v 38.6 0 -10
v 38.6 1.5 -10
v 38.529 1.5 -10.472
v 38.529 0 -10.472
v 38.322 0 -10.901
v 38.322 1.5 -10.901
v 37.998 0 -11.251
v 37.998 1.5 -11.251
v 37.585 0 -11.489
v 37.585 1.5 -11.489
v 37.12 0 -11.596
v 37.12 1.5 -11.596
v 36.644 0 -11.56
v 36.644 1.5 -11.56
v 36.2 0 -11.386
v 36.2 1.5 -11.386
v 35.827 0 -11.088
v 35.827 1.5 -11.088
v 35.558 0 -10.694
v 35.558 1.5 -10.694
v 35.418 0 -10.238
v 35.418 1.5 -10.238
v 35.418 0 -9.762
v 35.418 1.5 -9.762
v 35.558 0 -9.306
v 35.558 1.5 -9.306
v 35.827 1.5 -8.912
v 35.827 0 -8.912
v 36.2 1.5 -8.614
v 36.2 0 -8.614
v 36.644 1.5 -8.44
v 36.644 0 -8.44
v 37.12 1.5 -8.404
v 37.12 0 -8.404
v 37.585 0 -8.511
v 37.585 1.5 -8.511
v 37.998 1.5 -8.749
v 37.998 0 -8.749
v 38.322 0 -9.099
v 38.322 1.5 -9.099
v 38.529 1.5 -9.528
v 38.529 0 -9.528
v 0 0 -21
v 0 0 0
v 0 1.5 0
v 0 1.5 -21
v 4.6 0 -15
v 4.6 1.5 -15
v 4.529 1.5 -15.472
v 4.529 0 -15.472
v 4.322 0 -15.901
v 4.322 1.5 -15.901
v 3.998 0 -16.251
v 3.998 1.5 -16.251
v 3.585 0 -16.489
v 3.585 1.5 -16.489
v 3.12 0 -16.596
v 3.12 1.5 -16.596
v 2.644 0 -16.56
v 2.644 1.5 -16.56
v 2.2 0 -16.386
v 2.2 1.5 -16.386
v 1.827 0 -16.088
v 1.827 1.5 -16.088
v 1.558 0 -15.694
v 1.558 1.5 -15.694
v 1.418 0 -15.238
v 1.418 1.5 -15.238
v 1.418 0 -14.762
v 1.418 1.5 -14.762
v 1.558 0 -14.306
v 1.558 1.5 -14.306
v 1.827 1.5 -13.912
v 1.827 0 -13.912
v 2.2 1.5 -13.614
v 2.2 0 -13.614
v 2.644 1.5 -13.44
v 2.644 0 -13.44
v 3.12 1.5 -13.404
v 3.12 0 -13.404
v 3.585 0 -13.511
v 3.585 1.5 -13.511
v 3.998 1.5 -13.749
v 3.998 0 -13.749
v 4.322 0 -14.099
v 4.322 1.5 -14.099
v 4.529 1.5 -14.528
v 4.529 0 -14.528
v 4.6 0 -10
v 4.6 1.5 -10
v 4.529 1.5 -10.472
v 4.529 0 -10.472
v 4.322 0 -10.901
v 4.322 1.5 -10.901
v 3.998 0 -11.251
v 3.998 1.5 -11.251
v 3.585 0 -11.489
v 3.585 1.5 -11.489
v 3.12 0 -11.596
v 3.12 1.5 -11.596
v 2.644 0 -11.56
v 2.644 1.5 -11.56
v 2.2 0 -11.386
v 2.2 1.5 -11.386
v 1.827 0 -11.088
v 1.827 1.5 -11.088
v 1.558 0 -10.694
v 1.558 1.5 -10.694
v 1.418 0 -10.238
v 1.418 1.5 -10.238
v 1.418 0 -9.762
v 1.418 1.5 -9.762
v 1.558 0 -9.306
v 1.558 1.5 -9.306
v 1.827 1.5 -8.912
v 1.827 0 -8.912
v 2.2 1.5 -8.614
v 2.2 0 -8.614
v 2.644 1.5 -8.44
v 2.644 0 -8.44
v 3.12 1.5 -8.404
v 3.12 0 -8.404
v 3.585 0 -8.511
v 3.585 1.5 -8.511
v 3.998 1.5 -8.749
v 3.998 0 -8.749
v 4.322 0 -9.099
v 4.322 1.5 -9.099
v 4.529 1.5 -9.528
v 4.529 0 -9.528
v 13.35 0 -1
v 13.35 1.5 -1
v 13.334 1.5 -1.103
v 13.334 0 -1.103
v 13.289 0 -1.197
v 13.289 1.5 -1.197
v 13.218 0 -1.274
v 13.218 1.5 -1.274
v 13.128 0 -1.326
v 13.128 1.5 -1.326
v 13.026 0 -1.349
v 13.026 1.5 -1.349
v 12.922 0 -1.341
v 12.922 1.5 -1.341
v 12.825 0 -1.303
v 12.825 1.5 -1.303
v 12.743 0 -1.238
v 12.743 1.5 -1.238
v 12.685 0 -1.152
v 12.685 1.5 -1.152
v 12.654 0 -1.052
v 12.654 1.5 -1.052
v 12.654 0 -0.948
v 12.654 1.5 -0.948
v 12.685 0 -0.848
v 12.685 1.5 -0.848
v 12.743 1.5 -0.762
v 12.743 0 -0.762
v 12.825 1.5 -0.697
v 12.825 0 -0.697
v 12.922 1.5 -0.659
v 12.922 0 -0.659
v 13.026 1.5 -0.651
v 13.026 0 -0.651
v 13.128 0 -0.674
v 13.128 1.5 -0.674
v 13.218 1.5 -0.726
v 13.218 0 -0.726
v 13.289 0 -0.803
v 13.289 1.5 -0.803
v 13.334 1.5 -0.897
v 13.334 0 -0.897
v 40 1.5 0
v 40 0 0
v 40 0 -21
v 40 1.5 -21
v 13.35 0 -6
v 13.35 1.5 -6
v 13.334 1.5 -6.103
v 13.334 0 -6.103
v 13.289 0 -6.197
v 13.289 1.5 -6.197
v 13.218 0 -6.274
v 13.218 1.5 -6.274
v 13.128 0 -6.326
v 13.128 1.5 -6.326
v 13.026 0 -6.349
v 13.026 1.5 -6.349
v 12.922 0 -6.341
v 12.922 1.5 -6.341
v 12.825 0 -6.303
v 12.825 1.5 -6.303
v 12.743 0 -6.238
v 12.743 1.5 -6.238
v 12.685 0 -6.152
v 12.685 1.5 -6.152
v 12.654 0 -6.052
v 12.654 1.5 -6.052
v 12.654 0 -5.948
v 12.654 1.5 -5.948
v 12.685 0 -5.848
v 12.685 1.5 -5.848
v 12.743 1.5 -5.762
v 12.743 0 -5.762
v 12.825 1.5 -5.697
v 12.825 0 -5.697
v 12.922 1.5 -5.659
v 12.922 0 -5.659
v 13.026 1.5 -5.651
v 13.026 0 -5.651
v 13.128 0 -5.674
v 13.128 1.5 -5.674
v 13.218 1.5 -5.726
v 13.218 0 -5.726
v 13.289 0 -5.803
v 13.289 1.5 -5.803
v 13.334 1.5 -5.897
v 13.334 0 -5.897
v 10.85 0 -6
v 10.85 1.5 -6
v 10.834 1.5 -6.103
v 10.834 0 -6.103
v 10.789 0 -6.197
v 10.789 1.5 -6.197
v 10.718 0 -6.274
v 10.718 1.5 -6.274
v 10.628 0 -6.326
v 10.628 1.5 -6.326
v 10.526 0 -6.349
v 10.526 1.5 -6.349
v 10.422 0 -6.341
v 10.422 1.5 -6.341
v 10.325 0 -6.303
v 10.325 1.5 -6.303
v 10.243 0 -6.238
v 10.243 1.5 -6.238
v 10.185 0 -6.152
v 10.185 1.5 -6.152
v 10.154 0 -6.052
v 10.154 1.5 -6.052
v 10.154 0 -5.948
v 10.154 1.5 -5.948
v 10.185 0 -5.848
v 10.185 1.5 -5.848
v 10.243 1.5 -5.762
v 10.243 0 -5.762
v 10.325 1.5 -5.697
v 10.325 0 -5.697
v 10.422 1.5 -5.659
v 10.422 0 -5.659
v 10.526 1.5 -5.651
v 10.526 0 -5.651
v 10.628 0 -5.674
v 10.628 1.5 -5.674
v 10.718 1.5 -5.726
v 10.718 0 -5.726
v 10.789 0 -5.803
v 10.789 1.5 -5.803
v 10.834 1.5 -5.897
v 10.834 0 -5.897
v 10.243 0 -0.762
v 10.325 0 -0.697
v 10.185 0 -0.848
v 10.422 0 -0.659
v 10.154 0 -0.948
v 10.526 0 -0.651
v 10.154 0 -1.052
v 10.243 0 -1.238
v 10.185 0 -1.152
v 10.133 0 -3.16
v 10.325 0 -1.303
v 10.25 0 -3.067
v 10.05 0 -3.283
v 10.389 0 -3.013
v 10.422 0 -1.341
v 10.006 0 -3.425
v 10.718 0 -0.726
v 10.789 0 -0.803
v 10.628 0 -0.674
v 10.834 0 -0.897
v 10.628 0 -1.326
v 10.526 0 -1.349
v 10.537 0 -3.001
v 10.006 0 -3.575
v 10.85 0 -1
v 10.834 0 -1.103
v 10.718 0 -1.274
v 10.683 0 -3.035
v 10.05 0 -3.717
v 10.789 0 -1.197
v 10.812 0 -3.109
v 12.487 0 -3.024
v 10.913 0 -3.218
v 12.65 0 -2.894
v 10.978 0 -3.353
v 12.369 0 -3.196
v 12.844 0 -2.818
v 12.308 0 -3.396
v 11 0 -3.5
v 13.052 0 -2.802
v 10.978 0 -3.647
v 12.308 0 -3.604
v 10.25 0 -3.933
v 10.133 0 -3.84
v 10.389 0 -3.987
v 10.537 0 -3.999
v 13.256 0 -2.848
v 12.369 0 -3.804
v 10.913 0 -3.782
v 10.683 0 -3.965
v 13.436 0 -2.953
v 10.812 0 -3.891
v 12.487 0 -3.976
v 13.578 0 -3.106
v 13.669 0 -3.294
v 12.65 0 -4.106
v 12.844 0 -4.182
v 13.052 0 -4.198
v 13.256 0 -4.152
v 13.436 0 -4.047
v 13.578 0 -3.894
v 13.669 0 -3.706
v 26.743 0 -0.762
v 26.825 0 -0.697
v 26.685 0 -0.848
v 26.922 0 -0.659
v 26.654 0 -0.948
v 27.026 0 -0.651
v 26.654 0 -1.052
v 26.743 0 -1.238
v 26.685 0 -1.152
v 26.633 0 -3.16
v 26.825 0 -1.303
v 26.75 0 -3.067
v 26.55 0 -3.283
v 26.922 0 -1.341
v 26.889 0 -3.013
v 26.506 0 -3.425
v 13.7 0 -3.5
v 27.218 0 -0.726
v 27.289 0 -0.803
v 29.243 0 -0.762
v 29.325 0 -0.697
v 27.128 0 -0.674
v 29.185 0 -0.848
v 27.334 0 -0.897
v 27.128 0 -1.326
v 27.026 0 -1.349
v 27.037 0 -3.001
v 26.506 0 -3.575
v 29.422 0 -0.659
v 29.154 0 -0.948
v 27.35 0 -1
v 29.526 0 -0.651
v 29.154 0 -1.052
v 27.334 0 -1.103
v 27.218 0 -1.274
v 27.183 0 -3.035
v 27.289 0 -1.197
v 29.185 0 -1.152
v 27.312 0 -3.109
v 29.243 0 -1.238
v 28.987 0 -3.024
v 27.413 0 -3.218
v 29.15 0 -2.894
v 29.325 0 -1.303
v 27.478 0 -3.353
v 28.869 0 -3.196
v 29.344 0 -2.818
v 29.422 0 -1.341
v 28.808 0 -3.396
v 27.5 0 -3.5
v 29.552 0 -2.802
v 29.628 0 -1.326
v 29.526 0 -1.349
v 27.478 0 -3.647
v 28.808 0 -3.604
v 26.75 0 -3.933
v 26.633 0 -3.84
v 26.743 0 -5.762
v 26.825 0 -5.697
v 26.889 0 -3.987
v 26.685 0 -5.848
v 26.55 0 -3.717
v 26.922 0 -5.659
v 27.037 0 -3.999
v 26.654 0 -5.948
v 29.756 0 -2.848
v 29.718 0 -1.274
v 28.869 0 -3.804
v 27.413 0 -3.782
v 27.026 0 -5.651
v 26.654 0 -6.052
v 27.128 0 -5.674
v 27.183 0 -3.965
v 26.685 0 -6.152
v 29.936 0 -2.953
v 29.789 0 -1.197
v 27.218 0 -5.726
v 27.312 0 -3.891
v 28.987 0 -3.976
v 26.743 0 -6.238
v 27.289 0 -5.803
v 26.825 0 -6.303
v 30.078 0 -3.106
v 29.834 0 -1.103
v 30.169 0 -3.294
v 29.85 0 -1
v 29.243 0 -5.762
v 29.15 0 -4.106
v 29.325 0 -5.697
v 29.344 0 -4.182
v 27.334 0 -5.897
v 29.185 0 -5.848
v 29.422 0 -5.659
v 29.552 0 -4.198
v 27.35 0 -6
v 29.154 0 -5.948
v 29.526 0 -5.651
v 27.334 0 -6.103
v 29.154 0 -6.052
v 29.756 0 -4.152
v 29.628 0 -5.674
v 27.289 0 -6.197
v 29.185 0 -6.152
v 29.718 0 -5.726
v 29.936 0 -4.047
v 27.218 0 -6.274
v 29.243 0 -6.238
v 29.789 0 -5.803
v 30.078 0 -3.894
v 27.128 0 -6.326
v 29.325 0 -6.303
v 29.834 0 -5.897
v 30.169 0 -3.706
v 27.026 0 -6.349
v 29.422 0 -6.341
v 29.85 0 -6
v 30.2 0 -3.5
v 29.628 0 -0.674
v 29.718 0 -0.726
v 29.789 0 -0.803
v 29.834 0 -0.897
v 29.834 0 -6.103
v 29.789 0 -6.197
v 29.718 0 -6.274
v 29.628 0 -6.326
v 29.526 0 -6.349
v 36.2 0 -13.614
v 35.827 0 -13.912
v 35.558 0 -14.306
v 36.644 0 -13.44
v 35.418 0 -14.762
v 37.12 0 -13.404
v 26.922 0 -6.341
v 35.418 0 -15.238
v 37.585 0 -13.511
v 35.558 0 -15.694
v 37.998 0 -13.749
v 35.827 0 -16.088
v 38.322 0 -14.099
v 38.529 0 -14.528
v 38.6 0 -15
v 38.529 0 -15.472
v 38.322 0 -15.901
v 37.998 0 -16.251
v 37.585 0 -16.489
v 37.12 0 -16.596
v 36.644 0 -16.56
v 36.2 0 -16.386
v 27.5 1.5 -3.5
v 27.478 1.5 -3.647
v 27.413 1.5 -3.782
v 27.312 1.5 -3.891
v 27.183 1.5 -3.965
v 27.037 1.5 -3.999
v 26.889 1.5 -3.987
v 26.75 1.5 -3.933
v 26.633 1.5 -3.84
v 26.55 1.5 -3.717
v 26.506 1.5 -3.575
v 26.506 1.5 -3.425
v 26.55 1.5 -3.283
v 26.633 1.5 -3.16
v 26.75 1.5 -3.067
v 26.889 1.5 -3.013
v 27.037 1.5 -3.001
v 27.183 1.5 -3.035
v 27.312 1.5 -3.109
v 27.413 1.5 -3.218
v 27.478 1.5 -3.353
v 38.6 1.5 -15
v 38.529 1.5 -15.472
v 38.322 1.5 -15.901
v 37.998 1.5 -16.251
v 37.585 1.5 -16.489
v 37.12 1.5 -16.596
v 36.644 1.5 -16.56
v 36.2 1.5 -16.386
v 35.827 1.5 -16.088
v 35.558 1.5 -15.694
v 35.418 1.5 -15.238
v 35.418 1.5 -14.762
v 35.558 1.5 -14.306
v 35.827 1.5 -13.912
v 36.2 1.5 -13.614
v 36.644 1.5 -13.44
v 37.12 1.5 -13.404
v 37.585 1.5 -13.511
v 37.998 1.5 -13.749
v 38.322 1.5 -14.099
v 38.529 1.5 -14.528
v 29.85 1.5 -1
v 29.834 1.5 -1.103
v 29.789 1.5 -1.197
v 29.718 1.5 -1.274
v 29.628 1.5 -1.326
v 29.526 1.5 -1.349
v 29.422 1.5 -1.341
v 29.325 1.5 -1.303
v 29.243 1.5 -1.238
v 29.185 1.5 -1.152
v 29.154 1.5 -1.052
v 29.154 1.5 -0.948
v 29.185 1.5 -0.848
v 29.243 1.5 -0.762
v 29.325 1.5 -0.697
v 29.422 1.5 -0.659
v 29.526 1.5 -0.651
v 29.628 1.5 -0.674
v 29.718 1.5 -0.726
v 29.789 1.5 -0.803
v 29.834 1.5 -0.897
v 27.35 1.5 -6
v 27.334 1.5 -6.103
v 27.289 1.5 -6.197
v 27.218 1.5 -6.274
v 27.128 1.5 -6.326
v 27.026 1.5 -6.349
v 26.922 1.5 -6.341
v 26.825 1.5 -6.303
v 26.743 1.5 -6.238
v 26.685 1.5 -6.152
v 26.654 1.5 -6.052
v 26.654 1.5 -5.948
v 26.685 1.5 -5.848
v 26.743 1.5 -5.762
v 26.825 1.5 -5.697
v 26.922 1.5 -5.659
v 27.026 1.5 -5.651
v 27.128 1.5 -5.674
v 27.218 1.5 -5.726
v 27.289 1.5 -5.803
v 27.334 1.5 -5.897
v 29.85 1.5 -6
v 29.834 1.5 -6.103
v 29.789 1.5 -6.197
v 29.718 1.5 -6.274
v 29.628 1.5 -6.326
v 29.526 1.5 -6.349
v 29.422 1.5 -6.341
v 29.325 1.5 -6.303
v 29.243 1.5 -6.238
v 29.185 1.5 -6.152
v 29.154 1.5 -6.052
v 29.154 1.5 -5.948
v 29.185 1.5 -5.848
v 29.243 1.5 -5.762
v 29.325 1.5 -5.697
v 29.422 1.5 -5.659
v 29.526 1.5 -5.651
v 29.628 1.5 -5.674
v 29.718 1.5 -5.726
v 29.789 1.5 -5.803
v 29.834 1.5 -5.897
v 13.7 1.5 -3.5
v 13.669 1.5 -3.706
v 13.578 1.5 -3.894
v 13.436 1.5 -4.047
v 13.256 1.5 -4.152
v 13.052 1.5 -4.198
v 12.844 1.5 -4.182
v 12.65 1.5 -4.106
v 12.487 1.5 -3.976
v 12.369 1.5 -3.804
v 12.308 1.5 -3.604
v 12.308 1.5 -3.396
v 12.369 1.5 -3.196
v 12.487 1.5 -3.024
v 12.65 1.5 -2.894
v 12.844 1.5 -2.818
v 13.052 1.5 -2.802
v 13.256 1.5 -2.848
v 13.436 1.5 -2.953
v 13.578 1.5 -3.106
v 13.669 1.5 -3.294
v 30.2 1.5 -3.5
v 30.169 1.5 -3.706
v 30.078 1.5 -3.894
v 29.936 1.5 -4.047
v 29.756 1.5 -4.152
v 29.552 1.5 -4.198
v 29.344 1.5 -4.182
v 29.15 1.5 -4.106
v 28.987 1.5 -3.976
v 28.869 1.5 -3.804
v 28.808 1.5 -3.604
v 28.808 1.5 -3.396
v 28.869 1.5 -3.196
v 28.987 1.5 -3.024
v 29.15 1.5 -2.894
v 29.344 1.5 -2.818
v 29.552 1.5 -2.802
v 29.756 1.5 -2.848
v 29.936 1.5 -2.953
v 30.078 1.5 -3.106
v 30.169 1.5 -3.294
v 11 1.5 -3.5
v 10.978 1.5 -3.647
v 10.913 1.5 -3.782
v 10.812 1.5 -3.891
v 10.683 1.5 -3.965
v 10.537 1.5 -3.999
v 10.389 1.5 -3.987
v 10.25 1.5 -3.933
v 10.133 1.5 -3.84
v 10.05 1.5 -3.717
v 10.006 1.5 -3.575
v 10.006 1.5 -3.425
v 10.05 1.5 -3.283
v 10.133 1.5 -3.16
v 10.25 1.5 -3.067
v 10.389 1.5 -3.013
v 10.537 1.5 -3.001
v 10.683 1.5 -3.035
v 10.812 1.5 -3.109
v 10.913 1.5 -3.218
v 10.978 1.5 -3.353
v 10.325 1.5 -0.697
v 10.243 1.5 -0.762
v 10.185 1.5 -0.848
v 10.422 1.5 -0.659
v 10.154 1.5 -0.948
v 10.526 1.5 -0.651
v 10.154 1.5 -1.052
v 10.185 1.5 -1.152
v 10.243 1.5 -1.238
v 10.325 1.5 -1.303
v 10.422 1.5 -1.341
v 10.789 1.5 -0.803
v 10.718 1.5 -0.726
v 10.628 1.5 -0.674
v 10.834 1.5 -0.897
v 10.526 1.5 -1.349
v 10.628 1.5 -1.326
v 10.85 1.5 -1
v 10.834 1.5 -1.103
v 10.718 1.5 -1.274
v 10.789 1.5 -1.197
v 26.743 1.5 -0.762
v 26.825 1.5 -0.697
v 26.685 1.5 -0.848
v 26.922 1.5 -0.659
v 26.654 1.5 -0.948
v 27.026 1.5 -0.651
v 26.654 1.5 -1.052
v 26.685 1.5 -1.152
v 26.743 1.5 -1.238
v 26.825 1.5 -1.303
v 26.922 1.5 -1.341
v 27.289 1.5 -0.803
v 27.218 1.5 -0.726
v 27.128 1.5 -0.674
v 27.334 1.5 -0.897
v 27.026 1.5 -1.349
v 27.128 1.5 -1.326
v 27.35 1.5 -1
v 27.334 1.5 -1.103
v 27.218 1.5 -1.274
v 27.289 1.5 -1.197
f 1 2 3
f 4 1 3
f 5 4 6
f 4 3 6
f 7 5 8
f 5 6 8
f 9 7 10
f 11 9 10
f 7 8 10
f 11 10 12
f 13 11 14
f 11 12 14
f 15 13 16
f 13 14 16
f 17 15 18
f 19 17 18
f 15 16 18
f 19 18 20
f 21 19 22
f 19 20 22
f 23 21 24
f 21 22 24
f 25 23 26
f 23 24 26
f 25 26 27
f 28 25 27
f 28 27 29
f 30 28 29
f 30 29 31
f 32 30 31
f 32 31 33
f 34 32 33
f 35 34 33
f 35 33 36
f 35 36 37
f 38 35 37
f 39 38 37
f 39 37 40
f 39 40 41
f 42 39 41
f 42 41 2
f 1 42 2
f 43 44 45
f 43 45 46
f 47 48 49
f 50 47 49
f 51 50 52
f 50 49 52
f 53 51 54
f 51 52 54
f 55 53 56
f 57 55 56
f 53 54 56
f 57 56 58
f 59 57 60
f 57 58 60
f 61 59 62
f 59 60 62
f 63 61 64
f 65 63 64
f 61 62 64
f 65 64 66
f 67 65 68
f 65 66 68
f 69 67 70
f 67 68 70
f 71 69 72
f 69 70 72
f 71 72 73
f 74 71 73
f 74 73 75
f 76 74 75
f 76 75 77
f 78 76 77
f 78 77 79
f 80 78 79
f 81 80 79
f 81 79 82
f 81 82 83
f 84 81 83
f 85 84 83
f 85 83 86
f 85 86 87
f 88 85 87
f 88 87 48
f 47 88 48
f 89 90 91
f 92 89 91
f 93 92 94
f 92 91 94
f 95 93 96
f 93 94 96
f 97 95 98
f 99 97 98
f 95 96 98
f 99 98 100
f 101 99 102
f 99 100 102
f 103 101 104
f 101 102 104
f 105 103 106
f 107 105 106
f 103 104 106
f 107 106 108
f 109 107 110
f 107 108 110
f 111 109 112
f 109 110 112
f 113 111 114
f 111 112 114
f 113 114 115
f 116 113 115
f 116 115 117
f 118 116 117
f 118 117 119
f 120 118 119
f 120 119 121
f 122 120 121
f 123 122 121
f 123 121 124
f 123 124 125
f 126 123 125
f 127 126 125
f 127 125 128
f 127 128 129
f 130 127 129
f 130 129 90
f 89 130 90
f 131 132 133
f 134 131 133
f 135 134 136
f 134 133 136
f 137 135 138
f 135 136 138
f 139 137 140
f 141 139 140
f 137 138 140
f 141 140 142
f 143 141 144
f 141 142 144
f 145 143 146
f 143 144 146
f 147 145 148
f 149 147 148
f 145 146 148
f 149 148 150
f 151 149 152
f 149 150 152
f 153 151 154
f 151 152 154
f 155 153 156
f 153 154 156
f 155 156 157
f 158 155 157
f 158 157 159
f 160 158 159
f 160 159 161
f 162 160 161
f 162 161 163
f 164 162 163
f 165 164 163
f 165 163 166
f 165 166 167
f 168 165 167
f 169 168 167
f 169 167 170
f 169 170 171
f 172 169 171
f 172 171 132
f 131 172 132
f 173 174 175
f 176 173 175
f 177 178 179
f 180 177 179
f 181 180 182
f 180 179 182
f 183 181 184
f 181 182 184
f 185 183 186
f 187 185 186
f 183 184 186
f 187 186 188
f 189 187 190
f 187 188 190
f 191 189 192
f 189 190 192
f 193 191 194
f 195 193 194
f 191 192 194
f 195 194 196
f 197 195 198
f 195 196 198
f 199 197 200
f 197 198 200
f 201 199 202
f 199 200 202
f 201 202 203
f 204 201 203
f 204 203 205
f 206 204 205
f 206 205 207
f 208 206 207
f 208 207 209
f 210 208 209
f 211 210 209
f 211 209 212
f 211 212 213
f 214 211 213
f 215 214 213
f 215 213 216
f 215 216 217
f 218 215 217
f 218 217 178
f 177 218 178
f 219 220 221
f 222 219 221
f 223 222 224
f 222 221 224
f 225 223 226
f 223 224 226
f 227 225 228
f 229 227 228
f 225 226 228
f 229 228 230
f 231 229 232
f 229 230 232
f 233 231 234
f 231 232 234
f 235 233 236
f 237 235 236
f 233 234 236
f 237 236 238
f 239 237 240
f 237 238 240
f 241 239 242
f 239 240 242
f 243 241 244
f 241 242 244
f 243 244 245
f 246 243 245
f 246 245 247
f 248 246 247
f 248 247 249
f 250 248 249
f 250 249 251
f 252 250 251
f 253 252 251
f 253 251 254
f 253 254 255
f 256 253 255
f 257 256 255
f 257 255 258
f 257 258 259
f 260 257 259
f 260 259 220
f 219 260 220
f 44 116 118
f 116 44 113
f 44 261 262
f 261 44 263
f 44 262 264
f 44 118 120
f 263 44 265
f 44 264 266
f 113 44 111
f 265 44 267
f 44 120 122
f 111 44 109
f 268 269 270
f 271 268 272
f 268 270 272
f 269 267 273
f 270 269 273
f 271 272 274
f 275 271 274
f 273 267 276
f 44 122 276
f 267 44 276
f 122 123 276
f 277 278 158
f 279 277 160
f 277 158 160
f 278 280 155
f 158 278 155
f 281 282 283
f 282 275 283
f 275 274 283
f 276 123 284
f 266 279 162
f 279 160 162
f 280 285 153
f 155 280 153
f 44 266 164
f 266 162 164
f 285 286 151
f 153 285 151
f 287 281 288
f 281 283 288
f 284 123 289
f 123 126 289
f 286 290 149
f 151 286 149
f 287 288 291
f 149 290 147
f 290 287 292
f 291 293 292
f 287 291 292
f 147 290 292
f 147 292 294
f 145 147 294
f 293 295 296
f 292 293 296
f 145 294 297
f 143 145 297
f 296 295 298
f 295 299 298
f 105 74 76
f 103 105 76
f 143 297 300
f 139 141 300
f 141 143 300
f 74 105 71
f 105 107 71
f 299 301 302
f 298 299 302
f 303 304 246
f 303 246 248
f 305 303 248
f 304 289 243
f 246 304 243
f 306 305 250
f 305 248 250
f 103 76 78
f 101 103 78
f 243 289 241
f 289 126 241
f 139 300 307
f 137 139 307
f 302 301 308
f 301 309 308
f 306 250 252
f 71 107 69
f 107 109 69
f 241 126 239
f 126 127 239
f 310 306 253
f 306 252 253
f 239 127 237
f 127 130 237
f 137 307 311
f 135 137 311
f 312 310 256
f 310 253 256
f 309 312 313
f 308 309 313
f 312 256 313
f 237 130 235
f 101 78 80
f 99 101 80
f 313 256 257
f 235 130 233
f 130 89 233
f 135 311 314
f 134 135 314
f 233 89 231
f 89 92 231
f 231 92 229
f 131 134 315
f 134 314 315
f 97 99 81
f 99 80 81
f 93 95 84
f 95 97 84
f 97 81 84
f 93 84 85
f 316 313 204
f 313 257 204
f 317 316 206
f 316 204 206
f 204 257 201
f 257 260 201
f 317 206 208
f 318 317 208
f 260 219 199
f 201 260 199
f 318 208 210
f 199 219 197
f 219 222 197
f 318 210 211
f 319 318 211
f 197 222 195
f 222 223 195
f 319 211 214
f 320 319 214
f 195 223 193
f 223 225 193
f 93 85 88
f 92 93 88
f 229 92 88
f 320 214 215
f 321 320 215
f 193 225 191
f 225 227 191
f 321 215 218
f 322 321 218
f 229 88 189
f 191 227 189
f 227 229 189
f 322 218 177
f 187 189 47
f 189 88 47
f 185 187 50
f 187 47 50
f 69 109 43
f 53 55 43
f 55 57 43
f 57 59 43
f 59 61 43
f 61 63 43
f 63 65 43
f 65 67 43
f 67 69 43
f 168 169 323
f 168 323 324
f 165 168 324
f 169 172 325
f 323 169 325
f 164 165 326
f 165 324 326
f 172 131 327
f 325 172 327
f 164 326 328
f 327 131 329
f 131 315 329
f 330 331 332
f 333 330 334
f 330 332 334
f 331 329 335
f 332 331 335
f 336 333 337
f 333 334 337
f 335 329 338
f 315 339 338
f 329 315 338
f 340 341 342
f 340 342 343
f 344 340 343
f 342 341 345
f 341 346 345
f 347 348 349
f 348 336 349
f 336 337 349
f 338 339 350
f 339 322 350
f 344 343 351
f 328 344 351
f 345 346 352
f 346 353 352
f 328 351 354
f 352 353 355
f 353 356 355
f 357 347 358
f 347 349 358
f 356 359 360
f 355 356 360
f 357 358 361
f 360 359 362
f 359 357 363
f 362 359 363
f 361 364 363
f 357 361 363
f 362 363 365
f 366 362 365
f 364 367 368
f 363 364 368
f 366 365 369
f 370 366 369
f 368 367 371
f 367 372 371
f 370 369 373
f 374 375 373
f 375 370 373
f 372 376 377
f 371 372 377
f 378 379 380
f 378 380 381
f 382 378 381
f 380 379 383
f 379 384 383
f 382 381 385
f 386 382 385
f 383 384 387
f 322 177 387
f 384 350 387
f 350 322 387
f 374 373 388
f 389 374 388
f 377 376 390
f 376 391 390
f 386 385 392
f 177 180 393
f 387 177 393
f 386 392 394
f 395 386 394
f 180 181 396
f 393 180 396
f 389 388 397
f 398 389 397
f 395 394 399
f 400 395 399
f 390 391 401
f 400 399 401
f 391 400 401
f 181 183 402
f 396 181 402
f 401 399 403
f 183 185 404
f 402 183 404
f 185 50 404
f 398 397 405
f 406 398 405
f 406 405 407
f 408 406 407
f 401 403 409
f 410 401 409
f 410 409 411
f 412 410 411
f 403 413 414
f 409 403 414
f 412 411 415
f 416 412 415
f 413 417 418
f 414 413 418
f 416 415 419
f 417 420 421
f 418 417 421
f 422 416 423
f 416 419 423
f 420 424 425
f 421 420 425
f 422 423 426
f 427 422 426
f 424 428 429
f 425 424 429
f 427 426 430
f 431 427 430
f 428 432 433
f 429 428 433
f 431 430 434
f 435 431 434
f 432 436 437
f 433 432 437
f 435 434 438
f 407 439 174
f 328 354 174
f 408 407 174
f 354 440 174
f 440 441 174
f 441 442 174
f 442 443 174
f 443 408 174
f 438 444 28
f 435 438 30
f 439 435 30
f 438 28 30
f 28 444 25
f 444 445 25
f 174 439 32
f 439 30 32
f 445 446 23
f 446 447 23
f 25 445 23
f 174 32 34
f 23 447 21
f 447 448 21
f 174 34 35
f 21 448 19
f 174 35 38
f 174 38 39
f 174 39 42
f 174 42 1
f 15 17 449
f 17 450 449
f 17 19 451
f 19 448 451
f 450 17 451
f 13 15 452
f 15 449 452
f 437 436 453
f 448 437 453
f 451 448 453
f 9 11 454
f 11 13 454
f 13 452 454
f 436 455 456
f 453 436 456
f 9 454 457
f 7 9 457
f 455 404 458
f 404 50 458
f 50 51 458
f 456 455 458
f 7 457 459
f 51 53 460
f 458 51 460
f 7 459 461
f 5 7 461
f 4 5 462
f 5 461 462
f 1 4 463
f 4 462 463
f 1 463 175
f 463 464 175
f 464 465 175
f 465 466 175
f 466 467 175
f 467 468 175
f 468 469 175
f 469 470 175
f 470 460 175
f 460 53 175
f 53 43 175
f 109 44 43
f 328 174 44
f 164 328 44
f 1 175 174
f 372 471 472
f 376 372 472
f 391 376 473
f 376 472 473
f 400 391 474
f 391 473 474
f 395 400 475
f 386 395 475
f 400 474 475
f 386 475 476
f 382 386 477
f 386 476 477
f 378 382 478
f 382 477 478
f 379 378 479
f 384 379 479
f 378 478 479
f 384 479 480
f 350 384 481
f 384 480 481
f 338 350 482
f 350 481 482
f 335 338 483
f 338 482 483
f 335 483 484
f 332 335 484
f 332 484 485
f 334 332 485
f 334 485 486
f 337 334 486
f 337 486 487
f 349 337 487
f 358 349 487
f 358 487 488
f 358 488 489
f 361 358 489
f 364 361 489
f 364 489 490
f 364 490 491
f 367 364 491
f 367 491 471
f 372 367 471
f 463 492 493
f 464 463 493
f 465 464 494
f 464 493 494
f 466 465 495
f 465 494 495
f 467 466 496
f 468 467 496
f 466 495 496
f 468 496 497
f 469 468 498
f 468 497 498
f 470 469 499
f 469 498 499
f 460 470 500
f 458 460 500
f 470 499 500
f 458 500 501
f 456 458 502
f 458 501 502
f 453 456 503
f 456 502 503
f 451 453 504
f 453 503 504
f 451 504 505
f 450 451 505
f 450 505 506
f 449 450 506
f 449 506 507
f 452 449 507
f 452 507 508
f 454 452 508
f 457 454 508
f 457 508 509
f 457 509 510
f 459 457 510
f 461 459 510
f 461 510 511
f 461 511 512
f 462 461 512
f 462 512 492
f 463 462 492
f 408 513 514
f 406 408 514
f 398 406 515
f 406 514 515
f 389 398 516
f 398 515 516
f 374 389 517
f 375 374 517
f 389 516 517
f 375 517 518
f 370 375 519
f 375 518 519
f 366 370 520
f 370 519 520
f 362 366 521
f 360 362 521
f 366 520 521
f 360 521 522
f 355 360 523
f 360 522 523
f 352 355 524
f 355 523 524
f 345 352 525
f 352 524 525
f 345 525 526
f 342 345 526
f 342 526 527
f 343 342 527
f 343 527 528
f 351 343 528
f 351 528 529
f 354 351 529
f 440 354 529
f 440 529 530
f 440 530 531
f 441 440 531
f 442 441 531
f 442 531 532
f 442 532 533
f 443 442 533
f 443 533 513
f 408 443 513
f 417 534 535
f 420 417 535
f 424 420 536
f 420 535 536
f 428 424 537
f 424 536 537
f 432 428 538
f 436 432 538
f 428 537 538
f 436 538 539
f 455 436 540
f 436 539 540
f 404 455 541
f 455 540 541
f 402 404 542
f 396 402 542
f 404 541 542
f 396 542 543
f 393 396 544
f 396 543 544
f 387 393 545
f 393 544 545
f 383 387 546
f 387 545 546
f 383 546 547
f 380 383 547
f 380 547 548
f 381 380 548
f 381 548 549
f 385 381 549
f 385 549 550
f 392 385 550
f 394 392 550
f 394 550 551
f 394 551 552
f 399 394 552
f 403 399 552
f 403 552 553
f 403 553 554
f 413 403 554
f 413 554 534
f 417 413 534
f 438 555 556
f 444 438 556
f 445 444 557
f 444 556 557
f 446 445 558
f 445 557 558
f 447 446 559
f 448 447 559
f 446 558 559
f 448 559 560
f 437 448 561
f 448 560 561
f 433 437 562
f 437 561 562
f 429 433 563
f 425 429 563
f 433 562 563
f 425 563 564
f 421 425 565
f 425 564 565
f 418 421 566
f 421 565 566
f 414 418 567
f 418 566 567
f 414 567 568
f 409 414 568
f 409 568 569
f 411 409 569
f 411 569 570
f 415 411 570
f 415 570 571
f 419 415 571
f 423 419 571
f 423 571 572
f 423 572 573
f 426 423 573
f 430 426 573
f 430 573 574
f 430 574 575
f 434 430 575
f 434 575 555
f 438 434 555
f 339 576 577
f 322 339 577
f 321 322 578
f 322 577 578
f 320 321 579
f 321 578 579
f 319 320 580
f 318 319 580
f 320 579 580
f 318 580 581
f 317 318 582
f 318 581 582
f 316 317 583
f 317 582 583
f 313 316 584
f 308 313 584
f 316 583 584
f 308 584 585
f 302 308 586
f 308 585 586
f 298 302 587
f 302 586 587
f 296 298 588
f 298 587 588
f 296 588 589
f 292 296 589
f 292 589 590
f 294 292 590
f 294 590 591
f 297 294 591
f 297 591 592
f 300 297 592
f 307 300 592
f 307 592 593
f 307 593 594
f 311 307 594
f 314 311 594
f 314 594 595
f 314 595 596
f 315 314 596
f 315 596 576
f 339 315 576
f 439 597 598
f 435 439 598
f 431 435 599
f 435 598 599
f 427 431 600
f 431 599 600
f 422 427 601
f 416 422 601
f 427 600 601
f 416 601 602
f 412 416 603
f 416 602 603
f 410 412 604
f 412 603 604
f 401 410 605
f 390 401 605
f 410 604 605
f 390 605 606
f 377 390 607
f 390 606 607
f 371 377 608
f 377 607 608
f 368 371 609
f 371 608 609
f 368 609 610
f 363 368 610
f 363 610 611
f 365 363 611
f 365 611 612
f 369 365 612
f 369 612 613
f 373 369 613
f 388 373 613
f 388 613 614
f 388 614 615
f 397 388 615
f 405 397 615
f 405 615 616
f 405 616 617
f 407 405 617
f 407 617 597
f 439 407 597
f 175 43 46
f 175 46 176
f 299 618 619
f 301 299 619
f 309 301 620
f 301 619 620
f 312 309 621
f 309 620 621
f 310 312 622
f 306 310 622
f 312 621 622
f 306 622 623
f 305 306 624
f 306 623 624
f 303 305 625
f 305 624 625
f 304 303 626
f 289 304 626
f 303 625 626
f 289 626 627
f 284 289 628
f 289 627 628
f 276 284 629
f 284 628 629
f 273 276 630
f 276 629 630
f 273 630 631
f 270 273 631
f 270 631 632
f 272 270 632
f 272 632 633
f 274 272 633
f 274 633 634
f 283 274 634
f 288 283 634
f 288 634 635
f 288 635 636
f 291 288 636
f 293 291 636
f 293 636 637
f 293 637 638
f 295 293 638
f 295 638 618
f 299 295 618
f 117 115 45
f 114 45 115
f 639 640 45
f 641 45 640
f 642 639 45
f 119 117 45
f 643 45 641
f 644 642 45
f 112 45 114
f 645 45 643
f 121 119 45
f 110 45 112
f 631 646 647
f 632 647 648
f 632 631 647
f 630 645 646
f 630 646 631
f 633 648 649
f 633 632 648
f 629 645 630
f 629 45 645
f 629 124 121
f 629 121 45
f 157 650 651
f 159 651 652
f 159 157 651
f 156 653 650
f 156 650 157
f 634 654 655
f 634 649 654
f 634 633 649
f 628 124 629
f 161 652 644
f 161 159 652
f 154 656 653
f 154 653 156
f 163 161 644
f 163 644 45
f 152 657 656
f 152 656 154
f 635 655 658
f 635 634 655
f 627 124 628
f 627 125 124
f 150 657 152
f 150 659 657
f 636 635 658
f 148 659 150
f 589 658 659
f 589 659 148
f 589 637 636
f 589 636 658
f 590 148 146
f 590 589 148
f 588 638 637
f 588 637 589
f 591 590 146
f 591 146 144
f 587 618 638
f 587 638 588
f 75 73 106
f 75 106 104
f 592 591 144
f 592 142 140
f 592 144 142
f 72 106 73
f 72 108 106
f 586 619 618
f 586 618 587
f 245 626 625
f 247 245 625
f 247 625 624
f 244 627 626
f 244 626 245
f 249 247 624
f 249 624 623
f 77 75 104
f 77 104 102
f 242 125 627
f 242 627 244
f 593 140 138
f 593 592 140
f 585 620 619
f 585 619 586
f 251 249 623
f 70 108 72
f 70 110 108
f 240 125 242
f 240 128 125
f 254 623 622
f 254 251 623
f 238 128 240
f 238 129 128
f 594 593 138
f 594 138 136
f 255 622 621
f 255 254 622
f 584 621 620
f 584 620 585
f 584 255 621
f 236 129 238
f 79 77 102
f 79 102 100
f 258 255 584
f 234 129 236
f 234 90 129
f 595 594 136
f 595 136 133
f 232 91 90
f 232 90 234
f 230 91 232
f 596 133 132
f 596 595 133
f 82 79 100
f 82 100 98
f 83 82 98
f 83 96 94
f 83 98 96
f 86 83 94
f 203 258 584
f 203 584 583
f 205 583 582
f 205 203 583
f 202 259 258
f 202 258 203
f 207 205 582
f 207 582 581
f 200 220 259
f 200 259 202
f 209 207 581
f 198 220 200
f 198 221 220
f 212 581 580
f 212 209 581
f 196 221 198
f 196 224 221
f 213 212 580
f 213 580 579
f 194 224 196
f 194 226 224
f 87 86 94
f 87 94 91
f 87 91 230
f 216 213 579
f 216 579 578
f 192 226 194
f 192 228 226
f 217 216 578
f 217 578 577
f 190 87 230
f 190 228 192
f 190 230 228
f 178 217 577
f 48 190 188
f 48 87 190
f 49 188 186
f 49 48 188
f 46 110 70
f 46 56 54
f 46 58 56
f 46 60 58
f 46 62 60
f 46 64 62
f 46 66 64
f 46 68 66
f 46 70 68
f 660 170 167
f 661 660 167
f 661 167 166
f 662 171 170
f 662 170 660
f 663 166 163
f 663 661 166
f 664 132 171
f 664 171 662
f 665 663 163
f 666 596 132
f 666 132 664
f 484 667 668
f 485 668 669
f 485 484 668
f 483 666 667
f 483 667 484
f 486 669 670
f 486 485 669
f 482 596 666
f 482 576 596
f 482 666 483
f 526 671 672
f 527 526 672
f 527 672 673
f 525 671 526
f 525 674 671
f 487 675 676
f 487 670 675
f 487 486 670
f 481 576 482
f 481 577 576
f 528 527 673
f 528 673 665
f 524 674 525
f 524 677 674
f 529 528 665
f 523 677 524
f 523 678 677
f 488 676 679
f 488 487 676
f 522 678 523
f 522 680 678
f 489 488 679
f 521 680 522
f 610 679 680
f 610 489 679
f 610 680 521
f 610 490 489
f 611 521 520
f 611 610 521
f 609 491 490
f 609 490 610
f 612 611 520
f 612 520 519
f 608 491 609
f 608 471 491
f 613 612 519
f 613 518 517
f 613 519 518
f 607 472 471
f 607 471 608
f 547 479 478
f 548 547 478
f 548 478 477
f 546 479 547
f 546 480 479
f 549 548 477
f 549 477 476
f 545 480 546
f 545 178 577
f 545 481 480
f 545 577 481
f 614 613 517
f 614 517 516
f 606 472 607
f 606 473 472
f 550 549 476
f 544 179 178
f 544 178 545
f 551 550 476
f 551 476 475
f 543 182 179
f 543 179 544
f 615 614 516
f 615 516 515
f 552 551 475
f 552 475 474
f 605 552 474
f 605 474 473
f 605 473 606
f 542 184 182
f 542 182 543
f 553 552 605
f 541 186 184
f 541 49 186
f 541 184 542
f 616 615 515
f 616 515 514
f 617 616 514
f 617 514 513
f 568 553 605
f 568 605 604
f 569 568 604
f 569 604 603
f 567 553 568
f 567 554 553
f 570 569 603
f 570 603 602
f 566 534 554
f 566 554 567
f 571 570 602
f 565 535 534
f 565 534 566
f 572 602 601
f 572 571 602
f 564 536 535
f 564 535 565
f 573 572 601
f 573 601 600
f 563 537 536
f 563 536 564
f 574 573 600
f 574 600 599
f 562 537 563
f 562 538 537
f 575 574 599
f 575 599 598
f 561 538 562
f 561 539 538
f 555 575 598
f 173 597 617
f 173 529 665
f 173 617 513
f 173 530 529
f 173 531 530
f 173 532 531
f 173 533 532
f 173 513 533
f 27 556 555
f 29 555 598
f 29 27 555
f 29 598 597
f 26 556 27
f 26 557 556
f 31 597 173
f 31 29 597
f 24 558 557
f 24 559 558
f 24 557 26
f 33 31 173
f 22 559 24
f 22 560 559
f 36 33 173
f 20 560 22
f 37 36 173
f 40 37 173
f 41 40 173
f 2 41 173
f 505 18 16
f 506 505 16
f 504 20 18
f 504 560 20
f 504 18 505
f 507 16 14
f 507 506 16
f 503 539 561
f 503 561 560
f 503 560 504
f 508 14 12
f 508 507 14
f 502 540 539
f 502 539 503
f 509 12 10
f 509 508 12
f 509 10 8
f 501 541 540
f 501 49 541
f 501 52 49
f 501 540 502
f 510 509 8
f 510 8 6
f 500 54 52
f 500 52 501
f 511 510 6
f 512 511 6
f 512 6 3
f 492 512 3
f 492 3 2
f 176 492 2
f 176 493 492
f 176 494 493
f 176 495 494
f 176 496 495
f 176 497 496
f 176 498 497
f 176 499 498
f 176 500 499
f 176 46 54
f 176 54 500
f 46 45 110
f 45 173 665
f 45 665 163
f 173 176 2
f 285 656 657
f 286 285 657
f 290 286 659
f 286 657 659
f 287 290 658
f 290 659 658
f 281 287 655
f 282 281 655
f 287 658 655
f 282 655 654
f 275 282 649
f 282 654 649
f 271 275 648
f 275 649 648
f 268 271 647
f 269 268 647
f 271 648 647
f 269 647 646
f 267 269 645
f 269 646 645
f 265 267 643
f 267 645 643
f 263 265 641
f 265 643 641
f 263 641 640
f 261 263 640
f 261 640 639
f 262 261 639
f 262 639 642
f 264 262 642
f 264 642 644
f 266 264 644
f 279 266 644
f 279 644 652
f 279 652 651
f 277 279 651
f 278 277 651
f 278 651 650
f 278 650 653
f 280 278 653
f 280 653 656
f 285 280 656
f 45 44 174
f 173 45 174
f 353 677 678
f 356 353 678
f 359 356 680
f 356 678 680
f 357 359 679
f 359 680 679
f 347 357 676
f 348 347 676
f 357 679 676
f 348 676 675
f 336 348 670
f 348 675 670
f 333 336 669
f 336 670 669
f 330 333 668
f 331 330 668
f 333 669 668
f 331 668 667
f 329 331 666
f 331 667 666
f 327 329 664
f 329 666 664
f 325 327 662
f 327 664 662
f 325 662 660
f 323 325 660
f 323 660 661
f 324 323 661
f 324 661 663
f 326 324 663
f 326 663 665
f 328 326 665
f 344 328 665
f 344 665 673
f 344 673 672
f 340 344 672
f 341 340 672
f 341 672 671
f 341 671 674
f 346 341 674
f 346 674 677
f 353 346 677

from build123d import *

# Parameters (mm, degrees)
SKETCH_1_W          = 40
SKETCH_1_H          = 21
EXTRUDE_1_DEPTH     = 1.5
SKETCH_2_R          = 0.7
SKETCH_2_R_2        = 0.5
SKETCH_2_R_3        = 0.35
SKETCH_2_R_4        = 1.6
CUT_EXTRUDE_1_DEPTH = 2.5


with BuildPart() as part:
    # Эскиз1 → Бобышка-Вытянуть1 (new body)
    with BuildSketch(Plane(origin=(0, 0, 0), x_dir=(1, 0, 0), z_dir=(0, 1, 0))):
        with Locations((20, 10.5)):
            Rectangle(SKETCH_1_W, SKETCH_1_H)
    extrude(amount=EXTRUDE_1_DEPTH)

    # Эскиз2 → Вырез-Вытянуть1 (cut, through all)
    with BuildSketch(Plane(origin=(0, 1.5, 0), x_dir=(1, 0, 0), z_dir=(0, 1, 0))):
        with Locations((29.5, 3.5)):
            Circle(SKETCH_2_R)
        with Locations((27, 3.5)):
            Circle(SKETCH_2_R_2)
        with Locations((13, 3.5)):
            Circle(SKETCH_2_R)
        with Locations((10.5, 3.5)):
            Circle(SKETCH_2_R_2)
        with Locations((27, 6)):
            Circle(SKETCH_2_R_3)
        with Locations((29.5, 6)):
            Circle(SKETCH_2_R_3)
        with Locations((29.5, 1)):
            Circle(SKETCH_2_R_3)
        with Locations((27, 1)):
            Circle(SKETCH_2_R_3)
        with Locations((13, 6)):
            Circle(SKETCH_2_R_3)
        with Locations((10.5, 6)):
            Circle(SKETCH_2_R_3)
        with Locations((10.5, 1)):
            Circle(SKETCH_2_R_3)
        with Locations((13, 1)):
            Circle(SKETCH_2_R_3)
        with Locations((3, 10)):
            Circle(SKETCH_2_R_4)
        with Locations((37, 10)):
            Circle(SKETCH_2_R_4)
        with Locations((3, 15)):
            Circle(SKETCH_2_R_4)
        with Locations((37, 15)):
            Circle(SKETCH_2_R_4)
    extrude(amount=-CUT_EXTRUDE_1_DEPTH, mode=Mode.SUBTRACT)


solid = part.part
